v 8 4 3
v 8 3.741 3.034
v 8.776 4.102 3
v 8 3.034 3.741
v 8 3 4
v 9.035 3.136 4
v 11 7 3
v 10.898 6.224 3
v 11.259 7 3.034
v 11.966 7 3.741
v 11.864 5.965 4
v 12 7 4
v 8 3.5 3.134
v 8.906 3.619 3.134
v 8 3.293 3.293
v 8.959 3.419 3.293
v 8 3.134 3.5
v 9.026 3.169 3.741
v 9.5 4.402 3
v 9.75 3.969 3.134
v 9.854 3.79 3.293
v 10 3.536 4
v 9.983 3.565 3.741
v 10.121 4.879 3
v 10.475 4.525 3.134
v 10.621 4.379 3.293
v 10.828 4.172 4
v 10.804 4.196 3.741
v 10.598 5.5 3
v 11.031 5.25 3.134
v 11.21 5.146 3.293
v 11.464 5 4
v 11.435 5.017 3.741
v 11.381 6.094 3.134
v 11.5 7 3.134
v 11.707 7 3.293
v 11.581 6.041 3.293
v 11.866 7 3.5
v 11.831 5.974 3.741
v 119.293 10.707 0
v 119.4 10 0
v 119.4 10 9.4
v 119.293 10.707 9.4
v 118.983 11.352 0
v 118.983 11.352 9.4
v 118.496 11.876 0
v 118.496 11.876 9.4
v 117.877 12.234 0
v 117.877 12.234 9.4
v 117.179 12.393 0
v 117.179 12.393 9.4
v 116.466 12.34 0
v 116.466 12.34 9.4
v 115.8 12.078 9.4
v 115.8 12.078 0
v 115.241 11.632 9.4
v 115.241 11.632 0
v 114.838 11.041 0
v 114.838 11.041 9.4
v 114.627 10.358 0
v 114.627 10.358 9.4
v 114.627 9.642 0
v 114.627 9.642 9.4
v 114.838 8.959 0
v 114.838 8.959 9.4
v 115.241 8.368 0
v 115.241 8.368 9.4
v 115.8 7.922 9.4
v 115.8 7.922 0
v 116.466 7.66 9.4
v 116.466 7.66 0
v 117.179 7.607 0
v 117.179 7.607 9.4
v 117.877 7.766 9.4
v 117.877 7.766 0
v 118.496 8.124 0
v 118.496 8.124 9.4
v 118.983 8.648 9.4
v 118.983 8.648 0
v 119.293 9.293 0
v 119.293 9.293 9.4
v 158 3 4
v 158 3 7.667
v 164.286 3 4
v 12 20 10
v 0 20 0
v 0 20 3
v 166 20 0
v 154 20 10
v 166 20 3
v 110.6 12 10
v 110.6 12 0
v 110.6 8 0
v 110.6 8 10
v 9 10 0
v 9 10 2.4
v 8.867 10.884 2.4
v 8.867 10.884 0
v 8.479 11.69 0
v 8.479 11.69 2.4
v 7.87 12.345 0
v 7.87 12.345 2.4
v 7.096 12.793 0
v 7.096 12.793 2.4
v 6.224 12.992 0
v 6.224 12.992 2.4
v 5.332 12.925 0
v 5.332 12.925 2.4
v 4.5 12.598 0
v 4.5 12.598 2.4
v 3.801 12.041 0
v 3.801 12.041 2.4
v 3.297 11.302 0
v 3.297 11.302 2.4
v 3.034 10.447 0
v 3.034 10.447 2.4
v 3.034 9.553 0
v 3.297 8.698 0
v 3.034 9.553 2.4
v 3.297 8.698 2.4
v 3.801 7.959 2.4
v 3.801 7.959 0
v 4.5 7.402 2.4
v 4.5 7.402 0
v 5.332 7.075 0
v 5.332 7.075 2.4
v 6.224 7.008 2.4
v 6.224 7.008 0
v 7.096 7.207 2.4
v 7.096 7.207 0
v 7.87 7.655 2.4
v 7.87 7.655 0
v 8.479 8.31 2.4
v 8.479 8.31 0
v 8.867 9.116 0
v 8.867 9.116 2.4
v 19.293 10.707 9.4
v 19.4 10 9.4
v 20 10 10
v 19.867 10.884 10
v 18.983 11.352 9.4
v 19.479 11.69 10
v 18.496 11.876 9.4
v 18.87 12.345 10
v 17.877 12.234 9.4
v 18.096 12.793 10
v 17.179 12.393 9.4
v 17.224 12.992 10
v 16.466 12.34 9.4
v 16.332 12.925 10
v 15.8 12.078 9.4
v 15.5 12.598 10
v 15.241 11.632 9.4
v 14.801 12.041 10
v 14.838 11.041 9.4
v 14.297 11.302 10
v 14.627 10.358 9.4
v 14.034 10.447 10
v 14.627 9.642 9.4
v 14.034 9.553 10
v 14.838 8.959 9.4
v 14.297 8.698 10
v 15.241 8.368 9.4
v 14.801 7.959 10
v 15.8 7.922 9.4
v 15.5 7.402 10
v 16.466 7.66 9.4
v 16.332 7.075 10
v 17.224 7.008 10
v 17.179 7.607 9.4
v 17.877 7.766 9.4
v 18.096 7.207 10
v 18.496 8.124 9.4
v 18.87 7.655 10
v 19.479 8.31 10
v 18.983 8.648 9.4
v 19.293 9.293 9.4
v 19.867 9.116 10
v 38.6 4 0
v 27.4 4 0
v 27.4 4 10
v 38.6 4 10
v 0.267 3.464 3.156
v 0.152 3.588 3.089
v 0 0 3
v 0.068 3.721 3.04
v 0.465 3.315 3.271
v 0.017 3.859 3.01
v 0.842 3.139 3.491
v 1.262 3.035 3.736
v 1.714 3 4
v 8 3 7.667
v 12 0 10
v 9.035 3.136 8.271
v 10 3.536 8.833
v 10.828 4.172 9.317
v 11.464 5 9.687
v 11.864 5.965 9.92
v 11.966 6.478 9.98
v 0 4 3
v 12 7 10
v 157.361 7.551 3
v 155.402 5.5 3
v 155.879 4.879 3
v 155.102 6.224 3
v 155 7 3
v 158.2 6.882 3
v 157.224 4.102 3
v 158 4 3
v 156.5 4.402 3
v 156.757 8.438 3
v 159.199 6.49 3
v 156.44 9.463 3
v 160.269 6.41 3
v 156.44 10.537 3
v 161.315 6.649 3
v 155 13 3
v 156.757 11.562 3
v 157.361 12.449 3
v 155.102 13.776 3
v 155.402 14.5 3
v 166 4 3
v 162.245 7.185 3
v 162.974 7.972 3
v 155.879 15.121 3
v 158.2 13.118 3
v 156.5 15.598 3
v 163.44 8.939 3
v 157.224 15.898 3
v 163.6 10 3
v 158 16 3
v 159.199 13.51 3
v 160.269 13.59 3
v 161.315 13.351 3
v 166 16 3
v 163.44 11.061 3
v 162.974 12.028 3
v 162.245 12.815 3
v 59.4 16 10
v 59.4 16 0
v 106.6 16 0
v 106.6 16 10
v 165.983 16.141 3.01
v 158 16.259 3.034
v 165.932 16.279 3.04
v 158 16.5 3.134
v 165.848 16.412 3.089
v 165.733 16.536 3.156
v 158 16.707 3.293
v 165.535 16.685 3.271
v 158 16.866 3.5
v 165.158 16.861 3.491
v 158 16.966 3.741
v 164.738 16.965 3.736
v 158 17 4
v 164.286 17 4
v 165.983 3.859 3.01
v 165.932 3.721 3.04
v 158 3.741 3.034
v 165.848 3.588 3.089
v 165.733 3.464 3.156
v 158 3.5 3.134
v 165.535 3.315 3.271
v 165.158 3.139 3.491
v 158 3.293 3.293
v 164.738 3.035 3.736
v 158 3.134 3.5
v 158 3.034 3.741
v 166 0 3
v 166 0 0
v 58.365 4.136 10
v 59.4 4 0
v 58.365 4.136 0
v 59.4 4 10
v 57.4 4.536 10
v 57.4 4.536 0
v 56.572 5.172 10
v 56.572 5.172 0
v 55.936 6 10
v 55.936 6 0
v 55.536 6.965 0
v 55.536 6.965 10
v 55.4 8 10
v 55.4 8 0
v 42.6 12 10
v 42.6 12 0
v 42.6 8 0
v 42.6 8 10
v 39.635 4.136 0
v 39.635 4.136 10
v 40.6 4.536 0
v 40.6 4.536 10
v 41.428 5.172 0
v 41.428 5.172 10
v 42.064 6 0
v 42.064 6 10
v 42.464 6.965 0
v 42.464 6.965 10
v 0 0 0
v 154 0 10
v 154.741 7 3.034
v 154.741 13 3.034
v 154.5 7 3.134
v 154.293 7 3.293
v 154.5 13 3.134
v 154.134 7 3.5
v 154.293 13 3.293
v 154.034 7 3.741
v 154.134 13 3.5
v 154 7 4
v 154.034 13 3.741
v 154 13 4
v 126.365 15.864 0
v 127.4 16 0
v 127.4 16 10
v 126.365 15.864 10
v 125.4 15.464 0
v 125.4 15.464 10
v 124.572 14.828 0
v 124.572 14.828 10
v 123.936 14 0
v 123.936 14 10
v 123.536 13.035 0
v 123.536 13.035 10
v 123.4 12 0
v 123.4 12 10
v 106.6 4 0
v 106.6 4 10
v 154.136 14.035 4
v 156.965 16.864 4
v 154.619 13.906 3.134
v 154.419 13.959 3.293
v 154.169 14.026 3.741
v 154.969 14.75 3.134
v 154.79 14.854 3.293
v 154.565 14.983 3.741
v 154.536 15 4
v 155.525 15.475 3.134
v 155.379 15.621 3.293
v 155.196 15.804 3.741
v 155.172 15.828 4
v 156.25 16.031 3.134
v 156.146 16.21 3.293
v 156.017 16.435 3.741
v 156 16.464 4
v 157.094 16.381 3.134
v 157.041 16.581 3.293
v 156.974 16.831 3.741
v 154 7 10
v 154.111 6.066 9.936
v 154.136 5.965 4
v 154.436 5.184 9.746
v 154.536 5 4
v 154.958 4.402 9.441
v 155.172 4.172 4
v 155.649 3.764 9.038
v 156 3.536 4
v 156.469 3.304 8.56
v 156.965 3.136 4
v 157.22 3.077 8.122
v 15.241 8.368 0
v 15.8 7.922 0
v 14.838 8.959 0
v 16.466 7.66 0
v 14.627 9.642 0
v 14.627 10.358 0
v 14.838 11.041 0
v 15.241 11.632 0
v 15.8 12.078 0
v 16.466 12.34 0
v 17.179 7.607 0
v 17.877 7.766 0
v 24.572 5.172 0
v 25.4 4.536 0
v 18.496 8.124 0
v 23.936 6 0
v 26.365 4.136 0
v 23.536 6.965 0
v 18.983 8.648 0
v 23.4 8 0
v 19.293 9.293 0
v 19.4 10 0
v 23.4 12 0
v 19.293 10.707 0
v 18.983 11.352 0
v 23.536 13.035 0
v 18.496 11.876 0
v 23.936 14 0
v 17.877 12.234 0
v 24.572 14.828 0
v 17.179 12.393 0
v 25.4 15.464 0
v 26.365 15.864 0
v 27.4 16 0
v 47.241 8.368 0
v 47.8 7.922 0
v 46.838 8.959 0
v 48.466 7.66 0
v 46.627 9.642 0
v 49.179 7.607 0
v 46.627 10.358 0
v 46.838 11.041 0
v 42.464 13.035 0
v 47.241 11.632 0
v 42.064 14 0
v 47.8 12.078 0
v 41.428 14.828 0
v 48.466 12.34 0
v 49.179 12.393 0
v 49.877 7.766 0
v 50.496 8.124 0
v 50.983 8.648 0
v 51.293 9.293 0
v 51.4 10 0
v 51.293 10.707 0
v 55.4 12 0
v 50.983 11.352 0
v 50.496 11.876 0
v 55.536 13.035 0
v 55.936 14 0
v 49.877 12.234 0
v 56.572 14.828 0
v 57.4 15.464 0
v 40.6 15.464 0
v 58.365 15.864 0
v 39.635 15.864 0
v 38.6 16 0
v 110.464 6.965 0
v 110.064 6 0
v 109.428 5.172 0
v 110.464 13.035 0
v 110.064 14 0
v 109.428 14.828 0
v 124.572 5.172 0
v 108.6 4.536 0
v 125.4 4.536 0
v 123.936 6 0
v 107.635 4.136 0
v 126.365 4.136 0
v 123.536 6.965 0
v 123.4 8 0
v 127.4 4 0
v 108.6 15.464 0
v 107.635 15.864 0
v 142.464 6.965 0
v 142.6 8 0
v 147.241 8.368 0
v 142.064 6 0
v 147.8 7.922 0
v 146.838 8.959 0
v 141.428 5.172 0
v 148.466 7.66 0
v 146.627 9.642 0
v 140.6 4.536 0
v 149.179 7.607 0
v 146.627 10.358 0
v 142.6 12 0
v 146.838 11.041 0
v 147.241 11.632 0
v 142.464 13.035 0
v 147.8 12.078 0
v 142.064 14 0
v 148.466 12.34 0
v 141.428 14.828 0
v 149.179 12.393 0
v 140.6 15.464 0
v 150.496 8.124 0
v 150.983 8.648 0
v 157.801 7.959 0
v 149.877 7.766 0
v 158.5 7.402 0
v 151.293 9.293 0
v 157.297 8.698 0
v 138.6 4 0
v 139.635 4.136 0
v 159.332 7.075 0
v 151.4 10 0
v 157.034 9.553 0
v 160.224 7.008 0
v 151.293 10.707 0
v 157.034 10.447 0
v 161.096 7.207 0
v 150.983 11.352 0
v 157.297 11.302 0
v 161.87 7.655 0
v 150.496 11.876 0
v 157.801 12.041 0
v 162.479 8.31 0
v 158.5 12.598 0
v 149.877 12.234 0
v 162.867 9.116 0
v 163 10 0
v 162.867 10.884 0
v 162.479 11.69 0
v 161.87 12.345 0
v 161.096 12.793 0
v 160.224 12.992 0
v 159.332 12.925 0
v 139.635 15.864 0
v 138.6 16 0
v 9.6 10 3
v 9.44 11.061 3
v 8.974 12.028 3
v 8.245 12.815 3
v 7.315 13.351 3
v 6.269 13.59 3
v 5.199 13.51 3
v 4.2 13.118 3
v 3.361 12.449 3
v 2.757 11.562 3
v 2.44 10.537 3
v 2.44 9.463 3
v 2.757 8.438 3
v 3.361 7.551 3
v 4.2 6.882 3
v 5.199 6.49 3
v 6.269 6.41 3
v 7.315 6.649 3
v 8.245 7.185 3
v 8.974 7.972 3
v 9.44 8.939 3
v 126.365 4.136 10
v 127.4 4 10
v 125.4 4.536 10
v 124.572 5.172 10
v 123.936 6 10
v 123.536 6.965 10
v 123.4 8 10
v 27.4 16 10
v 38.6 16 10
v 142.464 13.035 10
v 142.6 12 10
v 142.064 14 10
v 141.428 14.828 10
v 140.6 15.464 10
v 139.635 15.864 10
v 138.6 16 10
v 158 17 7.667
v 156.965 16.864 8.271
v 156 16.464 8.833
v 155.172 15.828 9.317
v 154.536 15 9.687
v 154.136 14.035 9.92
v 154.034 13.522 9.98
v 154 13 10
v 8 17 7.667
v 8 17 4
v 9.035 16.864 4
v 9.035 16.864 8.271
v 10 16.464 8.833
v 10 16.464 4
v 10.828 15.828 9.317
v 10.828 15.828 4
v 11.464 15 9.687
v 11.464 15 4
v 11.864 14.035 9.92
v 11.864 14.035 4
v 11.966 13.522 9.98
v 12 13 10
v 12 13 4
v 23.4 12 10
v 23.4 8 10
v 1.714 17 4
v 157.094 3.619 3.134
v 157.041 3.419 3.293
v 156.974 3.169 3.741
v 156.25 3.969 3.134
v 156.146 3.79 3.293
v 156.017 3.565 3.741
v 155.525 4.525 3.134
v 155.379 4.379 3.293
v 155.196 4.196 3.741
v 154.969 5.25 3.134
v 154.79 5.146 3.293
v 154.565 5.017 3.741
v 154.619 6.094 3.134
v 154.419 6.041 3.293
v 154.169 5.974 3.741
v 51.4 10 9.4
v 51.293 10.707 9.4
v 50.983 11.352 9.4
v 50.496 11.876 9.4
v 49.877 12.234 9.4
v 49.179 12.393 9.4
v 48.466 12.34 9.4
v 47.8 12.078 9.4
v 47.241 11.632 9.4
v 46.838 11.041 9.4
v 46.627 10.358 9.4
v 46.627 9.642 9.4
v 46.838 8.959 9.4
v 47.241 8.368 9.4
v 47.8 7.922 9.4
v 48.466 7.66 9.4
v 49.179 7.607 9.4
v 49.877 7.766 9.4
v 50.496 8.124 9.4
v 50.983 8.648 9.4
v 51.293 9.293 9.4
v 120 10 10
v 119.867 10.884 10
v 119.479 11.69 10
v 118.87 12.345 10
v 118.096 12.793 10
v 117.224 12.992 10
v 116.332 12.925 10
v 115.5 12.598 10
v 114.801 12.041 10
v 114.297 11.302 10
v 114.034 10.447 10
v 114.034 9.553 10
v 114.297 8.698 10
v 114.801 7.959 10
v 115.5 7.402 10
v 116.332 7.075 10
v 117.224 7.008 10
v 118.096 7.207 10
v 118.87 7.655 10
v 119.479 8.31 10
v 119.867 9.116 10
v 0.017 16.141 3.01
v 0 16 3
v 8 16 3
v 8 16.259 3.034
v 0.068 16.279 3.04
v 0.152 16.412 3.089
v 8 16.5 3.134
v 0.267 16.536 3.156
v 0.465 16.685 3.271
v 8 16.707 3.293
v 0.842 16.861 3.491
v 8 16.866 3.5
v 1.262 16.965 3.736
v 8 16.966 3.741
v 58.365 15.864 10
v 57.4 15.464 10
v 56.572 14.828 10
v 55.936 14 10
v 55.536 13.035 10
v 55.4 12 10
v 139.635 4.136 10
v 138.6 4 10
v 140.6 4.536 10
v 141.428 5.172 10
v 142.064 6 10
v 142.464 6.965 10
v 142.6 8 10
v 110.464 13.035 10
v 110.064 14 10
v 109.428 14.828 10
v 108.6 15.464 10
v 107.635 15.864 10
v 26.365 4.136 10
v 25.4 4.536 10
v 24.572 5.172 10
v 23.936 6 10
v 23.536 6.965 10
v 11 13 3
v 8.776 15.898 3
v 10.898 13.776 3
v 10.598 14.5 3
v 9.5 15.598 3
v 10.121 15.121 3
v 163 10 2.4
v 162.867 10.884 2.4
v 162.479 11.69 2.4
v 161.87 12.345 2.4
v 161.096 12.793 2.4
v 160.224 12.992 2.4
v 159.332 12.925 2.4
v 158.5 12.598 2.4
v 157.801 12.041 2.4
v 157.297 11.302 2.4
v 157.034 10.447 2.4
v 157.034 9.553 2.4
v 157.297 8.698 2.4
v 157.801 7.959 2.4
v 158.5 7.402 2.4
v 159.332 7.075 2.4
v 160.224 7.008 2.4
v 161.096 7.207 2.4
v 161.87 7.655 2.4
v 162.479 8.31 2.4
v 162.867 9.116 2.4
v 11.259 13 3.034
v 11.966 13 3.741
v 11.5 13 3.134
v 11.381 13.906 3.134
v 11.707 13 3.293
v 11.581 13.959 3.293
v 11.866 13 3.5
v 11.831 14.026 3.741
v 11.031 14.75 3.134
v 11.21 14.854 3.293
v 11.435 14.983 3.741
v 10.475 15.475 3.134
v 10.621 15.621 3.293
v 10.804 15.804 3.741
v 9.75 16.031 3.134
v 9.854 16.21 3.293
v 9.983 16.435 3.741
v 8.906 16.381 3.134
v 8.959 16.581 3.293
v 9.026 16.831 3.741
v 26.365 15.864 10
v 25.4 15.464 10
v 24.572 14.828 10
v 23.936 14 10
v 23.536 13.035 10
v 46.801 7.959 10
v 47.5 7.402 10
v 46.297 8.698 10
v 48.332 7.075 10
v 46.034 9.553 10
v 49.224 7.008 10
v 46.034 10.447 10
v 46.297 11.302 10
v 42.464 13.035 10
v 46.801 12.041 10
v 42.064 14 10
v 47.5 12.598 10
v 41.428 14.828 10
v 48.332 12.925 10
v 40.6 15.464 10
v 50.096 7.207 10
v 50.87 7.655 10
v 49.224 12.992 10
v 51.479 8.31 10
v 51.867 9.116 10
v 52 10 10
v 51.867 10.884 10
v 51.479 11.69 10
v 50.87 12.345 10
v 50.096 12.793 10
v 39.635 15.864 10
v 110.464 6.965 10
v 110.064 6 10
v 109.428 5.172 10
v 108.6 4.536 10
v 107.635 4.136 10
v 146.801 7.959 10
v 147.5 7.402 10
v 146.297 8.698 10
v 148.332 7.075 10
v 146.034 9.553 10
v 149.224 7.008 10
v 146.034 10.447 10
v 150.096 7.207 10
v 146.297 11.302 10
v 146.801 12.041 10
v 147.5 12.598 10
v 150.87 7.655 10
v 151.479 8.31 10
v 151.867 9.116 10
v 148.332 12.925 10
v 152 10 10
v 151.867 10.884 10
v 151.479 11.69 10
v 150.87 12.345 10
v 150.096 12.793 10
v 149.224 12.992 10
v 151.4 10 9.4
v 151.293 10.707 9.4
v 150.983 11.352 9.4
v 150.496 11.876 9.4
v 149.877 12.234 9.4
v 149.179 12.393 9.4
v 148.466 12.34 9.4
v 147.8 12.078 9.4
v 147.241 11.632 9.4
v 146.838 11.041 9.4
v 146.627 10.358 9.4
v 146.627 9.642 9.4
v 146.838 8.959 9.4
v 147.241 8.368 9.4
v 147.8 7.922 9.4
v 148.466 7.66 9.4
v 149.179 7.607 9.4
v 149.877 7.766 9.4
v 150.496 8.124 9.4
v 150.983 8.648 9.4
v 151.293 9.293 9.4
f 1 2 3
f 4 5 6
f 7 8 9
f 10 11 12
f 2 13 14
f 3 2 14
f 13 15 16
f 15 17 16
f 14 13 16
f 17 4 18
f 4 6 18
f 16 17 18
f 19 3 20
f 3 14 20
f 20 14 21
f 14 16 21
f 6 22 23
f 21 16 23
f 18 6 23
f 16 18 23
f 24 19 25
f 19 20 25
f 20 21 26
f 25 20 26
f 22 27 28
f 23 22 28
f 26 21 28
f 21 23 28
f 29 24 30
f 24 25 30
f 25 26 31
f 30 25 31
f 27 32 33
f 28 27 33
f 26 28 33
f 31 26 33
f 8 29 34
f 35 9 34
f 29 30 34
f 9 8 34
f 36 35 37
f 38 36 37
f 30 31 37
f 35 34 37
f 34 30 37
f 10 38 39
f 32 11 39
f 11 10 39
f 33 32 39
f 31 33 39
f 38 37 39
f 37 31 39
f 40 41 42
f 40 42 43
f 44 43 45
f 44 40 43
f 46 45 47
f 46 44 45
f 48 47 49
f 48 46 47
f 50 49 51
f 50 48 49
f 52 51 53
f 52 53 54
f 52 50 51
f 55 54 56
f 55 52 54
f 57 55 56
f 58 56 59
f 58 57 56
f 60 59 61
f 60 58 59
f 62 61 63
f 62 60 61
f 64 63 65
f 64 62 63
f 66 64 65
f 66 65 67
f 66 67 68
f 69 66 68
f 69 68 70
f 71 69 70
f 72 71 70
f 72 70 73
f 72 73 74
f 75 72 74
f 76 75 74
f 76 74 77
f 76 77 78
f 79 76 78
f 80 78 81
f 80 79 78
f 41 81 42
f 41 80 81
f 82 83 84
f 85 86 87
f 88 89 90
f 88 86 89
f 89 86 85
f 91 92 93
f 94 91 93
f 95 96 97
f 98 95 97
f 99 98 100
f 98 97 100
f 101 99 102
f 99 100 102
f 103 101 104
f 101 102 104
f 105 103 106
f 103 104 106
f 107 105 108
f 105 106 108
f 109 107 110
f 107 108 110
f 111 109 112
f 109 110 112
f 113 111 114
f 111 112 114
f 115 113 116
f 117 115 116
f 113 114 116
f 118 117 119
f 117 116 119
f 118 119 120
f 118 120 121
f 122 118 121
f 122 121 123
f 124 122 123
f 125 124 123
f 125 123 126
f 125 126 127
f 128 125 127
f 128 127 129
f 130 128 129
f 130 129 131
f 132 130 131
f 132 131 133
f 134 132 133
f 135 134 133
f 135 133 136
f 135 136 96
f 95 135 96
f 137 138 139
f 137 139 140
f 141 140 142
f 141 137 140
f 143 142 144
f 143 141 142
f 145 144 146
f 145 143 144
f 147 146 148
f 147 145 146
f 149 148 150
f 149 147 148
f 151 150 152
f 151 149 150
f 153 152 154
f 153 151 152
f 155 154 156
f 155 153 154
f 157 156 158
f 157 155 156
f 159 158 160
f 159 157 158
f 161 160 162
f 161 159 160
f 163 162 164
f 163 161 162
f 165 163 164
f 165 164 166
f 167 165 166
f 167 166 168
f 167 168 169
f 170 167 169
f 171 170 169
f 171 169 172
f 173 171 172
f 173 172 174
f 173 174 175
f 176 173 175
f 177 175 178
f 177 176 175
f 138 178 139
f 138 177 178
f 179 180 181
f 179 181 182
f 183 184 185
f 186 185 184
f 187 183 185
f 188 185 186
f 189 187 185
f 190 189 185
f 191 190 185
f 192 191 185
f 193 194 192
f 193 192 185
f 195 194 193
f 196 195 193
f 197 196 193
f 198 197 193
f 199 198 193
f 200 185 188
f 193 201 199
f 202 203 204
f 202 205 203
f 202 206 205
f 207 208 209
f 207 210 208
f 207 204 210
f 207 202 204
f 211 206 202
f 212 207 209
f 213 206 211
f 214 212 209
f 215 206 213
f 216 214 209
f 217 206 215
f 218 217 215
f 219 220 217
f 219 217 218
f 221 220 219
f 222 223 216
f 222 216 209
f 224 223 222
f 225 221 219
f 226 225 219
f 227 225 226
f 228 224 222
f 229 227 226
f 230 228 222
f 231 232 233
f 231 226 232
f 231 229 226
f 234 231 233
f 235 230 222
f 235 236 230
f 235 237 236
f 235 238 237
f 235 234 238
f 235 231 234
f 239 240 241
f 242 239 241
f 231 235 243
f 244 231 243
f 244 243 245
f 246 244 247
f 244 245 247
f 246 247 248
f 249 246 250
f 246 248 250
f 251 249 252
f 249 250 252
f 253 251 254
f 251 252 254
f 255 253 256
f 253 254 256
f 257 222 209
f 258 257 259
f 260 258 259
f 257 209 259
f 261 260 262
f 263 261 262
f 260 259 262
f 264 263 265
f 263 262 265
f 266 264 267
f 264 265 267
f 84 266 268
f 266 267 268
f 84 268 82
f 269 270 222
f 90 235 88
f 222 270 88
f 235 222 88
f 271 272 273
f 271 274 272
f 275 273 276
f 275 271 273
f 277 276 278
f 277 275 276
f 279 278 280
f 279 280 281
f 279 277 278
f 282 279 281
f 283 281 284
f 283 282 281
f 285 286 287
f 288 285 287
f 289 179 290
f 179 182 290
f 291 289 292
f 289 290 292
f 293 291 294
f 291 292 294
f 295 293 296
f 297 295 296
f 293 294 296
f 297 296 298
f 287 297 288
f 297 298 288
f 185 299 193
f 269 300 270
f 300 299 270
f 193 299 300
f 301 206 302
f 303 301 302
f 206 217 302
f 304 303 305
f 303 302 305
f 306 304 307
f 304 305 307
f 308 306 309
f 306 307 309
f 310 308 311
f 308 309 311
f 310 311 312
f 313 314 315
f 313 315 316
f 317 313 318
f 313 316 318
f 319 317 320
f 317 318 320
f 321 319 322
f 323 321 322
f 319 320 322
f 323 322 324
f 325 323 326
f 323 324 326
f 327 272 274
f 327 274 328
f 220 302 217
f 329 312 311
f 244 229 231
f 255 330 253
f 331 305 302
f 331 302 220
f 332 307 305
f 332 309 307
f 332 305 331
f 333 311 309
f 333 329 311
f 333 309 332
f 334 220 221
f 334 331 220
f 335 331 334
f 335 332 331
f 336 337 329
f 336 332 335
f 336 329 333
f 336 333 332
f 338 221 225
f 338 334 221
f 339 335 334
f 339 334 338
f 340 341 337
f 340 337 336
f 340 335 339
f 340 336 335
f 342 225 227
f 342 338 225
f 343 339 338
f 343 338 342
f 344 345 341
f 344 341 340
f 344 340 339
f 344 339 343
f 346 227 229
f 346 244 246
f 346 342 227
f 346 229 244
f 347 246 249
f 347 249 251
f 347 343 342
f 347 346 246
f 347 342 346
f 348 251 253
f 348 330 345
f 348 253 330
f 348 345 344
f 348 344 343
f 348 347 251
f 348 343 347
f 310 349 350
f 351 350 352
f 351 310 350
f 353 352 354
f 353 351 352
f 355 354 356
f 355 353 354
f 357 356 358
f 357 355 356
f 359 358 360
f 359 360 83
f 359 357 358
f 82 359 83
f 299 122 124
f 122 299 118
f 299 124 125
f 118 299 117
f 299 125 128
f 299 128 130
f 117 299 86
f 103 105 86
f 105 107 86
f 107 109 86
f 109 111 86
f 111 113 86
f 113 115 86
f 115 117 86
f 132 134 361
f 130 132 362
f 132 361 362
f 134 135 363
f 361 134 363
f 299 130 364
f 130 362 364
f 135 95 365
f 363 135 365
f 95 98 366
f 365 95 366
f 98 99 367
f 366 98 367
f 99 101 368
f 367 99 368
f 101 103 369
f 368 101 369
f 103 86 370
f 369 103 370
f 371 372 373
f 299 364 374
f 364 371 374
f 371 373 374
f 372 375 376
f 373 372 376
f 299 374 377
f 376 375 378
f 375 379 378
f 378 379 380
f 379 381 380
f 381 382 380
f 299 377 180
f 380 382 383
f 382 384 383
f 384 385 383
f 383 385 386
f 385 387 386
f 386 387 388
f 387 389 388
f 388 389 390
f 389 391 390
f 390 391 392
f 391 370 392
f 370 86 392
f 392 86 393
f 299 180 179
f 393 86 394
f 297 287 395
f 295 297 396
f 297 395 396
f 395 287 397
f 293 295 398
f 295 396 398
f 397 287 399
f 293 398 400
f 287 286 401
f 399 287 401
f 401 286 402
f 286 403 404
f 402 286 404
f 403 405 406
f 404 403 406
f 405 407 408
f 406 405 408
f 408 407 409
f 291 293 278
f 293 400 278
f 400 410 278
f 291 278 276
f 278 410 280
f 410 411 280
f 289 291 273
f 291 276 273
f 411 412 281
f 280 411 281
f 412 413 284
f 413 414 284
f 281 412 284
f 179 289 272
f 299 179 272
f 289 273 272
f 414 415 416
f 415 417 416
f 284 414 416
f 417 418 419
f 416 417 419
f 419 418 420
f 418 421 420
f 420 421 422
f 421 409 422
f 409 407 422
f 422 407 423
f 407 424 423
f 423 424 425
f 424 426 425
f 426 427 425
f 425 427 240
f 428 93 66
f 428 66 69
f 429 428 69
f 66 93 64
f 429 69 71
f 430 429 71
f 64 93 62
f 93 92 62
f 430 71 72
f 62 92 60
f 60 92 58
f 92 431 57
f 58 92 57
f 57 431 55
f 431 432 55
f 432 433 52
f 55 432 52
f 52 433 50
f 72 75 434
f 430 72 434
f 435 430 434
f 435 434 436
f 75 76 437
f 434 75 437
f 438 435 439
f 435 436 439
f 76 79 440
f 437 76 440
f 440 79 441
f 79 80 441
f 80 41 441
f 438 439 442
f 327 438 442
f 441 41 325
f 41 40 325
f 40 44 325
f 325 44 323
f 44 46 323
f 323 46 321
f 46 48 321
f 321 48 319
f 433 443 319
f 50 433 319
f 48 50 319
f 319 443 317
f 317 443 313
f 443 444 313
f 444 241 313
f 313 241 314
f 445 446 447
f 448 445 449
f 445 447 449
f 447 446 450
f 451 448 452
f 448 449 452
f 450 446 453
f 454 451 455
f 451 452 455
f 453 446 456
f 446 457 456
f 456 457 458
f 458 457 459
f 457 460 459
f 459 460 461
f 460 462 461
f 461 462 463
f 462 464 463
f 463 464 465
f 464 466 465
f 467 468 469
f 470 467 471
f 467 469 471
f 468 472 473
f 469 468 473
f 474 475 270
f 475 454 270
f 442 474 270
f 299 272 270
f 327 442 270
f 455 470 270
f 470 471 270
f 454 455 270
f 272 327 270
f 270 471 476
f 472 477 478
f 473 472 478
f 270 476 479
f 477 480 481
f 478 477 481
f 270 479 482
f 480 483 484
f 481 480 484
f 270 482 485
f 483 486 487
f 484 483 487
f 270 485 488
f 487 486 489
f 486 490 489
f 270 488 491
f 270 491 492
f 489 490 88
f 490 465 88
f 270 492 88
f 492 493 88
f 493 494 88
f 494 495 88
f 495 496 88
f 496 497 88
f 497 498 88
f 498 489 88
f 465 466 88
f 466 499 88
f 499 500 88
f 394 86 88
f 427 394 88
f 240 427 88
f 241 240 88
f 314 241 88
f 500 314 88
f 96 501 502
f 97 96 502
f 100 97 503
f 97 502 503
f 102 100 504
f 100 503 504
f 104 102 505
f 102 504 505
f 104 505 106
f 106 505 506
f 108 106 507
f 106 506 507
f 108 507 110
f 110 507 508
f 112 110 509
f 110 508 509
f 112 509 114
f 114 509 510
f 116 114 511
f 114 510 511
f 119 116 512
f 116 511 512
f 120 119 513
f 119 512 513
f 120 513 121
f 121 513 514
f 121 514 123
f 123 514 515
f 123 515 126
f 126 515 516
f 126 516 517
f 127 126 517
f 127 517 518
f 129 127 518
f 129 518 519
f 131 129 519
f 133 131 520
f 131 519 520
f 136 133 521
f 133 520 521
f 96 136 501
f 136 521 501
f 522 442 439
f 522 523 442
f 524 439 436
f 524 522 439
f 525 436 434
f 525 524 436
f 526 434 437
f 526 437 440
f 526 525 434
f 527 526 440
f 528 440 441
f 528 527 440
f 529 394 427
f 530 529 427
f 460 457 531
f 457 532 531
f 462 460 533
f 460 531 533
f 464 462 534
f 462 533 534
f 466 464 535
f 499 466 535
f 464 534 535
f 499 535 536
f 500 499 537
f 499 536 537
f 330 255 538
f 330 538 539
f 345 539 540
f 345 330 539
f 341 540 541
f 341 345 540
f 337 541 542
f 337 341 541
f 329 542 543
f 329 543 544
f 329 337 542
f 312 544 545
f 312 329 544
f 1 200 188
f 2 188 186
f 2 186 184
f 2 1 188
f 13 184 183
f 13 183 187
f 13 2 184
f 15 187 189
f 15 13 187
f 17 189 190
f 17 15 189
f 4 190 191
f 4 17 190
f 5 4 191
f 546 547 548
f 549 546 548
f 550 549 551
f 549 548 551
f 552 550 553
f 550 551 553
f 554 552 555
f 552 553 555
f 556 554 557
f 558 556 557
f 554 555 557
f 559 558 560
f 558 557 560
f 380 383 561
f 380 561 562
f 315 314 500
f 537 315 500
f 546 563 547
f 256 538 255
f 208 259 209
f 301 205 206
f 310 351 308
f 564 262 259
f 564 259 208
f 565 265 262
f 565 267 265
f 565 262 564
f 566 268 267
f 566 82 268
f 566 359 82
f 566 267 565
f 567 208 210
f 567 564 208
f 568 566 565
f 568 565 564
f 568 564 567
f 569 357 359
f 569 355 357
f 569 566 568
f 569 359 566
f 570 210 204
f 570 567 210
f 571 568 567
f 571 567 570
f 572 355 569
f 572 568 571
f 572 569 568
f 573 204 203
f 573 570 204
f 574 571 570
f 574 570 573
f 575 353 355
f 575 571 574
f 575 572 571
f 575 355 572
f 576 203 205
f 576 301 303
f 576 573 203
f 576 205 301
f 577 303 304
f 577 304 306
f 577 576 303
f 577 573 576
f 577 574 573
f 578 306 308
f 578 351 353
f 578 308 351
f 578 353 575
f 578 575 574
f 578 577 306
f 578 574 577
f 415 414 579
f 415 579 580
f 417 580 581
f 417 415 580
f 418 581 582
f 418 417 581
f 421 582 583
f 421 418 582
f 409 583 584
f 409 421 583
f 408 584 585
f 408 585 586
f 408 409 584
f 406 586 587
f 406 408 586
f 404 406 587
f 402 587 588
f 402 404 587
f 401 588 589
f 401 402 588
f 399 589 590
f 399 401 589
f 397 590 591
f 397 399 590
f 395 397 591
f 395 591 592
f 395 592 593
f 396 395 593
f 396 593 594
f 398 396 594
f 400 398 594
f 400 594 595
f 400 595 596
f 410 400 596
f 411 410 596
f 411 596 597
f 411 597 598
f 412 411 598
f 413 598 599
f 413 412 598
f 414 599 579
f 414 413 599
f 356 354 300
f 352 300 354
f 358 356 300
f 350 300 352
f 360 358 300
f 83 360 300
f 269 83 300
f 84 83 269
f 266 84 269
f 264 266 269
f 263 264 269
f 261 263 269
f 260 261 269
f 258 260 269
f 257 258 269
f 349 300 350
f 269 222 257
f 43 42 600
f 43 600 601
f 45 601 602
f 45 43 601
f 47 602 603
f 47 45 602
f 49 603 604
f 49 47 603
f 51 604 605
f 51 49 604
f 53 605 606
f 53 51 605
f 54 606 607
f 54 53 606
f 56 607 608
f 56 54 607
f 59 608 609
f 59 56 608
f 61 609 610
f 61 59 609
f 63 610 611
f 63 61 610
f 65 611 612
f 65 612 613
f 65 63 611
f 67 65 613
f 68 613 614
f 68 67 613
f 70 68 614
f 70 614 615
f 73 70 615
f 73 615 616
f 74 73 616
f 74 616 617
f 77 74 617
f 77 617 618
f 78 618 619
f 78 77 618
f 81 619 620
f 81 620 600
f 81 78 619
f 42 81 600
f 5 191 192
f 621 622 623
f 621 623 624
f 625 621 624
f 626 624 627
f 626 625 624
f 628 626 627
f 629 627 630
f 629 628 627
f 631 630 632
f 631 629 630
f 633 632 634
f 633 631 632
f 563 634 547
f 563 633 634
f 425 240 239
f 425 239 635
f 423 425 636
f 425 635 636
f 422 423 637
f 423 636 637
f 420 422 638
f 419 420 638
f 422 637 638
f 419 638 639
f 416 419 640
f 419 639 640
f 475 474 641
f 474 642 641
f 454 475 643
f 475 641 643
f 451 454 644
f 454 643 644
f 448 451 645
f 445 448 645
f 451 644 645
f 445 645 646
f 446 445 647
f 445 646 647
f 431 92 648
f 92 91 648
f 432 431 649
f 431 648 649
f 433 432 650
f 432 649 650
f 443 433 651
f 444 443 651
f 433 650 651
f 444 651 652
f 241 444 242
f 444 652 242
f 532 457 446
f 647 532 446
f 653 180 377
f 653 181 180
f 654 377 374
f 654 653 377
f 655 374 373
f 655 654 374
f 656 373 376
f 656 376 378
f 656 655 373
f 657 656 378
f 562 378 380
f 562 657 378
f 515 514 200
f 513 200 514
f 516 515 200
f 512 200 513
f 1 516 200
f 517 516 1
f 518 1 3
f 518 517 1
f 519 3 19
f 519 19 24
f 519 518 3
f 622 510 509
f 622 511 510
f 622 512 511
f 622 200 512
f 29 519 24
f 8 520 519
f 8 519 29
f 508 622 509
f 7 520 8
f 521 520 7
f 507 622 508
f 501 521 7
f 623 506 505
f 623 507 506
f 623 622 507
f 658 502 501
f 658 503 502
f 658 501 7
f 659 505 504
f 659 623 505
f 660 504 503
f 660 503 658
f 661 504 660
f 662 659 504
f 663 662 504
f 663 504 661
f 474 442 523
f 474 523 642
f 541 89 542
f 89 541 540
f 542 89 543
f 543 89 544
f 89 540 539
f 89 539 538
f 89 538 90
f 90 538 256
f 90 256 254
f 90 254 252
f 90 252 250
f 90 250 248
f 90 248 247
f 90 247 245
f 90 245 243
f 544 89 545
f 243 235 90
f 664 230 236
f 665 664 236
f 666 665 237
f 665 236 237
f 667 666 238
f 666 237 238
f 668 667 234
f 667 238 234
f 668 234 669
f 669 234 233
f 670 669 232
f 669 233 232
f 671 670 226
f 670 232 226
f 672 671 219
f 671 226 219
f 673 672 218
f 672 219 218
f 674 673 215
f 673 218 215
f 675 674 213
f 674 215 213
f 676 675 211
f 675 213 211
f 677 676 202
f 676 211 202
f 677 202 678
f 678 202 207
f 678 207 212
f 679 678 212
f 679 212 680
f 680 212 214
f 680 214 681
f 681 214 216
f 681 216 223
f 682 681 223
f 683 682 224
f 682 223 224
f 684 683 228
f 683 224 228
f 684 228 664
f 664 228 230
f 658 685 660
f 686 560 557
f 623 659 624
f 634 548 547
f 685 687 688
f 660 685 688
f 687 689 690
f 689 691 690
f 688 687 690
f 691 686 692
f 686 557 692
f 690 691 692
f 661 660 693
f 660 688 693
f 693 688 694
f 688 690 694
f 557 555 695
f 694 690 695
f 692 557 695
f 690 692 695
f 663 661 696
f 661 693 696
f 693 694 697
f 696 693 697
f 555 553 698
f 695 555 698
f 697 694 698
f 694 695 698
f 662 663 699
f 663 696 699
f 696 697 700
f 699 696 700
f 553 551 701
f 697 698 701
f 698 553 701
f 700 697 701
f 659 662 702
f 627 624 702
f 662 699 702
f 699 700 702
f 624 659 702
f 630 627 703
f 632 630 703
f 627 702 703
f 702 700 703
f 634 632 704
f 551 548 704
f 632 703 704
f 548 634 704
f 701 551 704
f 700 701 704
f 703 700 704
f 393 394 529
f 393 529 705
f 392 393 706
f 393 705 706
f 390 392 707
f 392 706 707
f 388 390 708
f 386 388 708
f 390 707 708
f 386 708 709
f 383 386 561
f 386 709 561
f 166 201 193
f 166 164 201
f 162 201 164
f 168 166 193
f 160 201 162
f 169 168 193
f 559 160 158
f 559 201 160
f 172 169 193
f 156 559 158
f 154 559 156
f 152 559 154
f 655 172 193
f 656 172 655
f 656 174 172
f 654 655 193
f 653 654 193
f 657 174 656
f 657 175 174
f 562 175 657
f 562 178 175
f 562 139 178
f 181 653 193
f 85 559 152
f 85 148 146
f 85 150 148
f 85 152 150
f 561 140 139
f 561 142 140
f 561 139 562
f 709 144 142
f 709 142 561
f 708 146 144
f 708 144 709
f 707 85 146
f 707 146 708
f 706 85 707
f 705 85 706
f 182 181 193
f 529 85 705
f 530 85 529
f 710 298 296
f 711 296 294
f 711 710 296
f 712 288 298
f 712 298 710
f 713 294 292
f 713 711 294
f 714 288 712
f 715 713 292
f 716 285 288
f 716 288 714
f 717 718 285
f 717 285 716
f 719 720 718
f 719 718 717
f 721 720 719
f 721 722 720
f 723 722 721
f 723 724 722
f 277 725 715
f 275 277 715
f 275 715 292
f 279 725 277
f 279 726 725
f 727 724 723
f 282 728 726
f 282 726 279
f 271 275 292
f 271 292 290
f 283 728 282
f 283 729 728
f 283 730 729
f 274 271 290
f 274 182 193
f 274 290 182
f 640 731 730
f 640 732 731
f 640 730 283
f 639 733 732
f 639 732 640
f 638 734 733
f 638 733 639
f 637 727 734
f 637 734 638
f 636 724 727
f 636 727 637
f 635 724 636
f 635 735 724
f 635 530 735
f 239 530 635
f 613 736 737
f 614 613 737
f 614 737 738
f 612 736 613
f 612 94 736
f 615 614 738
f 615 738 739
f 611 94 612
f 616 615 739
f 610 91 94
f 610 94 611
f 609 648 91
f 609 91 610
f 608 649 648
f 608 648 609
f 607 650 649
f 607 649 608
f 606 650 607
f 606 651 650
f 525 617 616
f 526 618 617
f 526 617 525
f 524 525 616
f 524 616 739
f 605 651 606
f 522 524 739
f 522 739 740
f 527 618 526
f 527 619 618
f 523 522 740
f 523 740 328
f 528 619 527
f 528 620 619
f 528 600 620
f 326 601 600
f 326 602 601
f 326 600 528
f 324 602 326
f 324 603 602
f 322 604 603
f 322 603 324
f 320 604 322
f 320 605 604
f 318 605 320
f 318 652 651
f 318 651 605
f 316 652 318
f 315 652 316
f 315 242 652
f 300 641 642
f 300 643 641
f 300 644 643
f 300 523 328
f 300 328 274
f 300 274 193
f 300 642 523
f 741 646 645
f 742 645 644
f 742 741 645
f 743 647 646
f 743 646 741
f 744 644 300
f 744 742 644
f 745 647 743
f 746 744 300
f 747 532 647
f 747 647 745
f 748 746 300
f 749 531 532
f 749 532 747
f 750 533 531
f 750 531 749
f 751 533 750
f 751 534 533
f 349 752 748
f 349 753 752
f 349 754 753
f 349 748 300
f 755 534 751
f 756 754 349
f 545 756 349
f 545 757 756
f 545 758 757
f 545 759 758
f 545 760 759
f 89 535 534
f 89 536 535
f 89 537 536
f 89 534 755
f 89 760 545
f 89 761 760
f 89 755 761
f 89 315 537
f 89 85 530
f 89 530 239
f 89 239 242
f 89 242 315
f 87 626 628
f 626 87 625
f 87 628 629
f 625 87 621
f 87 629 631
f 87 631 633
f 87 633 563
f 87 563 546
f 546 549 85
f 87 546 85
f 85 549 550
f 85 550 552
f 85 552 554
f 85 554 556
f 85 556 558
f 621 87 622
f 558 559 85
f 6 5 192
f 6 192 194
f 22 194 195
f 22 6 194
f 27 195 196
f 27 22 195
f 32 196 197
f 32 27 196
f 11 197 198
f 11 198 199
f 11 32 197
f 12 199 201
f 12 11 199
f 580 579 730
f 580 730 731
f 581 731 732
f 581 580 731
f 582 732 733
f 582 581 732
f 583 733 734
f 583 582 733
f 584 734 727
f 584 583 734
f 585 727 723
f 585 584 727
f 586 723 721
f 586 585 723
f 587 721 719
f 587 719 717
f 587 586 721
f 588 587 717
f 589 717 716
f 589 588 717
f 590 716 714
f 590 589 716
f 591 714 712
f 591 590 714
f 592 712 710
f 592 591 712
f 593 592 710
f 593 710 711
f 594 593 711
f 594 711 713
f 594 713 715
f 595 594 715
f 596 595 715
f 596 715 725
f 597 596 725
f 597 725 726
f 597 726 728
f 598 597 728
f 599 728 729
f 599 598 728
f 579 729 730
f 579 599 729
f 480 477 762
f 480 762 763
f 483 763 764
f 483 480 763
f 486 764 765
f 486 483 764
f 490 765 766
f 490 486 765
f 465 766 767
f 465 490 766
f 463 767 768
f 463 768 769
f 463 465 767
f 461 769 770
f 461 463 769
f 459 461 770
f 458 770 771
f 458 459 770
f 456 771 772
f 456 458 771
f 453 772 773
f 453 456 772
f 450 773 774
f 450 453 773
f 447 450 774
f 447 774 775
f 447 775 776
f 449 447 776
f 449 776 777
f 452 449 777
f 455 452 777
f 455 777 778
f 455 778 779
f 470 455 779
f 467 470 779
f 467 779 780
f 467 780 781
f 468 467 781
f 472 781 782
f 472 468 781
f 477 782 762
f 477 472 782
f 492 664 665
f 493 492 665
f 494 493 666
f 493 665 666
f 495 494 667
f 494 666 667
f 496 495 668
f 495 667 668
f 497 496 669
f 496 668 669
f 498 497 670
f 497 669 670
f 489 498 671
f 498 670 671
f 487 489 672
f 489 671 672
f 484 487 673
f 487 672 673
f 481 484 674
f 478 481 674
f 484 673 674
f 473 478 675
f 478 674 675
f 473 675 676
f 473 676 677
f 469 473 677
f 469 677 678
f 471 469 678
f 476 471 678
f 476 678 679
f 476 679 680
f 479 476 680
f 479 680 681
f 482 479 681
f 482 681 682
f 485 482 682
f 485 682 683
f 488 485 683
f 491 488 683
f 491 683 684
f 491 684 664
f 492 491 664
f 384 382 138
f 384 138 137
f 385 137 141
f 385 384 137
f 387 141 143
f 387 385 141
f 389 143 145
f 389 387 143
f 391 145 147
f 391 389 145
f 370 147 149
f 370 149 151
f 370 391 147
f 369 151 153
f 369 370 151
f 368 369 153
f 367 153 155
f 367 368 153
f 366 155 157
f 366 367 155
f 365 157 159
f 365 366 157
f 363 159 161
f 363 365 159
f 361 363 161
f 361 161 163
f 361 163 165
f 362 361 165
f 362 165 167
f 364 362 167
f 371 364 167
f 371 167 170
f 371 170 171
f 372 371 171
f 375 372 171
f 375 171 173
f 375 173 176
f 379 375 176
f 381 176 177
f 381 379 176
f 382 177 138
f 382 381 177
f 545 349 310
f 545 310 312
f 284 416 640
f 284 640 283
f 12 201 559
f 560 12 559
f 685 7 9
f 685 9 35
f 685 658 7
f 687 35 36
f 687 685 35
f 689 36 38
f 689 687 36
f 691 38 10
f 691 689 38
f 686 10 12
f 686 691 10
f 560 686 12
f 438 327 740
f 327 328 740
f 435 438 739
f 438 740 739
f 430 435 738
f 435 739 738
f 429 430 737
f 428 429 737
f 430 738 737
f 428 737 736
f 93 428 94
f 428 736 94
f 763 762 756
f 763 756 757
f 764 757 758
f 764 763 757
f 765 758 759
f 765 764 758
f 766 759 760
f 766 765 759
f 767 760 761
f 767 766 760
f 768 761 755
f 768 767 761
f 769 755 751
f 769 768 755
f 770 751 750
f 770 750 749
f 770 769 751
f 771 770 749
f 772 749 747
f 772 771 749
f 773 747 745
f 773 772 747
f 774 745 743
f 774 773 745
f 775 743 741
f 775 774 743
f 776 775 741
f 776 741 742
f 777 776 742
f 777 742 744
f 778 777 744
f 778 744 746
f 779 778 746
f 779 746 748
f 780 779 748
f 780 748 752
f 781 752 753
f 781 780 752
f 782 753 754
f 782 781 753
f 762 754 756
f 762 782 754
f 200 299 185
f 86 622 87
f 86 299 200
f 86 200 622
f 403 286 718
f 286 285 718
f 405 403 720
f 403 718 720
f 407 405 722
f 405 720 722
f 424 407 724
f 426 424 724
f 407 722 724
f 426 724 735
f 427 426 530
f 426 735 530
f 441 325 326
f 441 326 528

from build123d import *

# Parameters (mm, degrees)
F0_W          = 166
F0_H          = 20
F0_R          = 2.4
F1_DEPTH      = 10
F2_W          = 12
F2_H          = 14
F3_DEPTH      = 7
F5_DEPTH      = 3.001
F5_DEPTH_BACK = 17.001
F6_R          = 4
F7_R          = 1
F8_R          = 3
F9_DEPTH      = 3.001
F10_W         = 55.2
F10_H         = 12
F10_W_2       = 19.2
F11_DEPTH     = 10.001
F12_R         = 4
F13_SIZE      = 0.6


with BuildPart() as f1:
    # F0 (on Top) → F1 (new body)
    with BuildSketch(Plane.XY):
        with Locations((83, 10)):
            Rectangle(F0_W, F0_H)
        with Locations((17, 10)):
            Circle(F0_R, mode=Mode.SUBTRACT)
        with Locations((49, 10)):
            Circle(F0_R, mode=Mode.SUBTRACT)
        with Locations((117, 10)):
            Circle(F0_R, mode=Mode.SUBTRACT)
        with Locations((149, 10)):
            Circle(F0_R, mode=Mode.SUBTRACT)
    extrude(amount=F1_DEPTH)

    # F2 (on face) → F3 (cut)
    with BuildSketch(Plane.XY.offset(10)):
        with Locations((6, 10)):
            Rectangle(F2_W, F2_H)
        with Locations((160, 10)):
            Rectangle(F2_W, F2_H)
    extrude(amount=-F3_DEPTH, mode=Mode.SUBTRACT)

    # F4 (on face) → F5 (cut, two sides)
    with BuildSketch(Plane.XZ.offset(-17)) as f5_sk:
        Polygon((0, 10), (0, 3), (12, 10), align=None)
        Polygon((166, 3), (166, 10), (154, 10), align=None)
    extrude(amount=-F5_DEPTH, mode=Mode.SUBTRACT)
    extrude(f5_sk.sketch, amount=F5_DEPTH_BACK, mode=Mode.SUBTRACT)

    # F6
    f6_edges = [f1.edges().sort_by_distance(p)[0] for p in [
        (12, 17, 6.5),
        (12, 3, 6.5),
        (154, 3, 6.5),
        (154, 17, 6.5),
    ]]
    fillet(f6_edges, radius=F6_R)

    # F7
    f7_edges = [f1.edges().sort_by_distance(p)[0] for p in [
        (162, 17, 3),
        (4, 3, 3),
    ]]
    fillet(f7_edges, radius=F7_R)

    # F8 (on face) → F9 (cut, through all)
    with BuildSketch(Plane.XY.offset(3)):
        with Locations((160, 10)):
            Circle(F8_R)
        with Locations((6, 10)):
            Circle(F8_R)
    extrude(amount=-F9_DEPTH, mode=Mode.SUBTRACT)

    # F10 (on face) → F11 (cut, through all)
    with BuildSketch(Plane(origin=(0, 0, 0), x_dir=(1, 0, 0), z_dir=(0, 0, -1))):
        with Locations((83, -10)):
            Rectangle(F10_W, F10_H)
        with Locations((133, -10)):
            Rectangle(F10_W_2, F10_H)
        with Locations((33, -10)):
            Rectangle(F10_W_2, F10_H)
    extrude(amount=-F11_DEPTH, mode=Mode.SUBTRACT)

    # F12
    f12_edges = [f1.edges().sort_by_distance(p)[0] for p in [
        (123.4, 16, 5),
        (123.4, 4, 5),
        (142.6, 16, 5),
        (142.6, 4, 5),
        (110.6, 16, 5),
        (110.6, 4, 5),
        (55.4, 16, 5),
        (55.4, 4, 5),
        (42.6, 4, 5),
        (42.6, 16, 5),
        (23.4, 16, 5),
        (23.4, 4, 5),
    ]]
    fillet(f12_edges, radius=F12_R)

    # F13
    f13_edges = [f1.edges().sort_by_distance(p)[0] for p in [
        (3, 10, 3),
        (14.6, 10, 10),
        (46.6, 10, 10),
        (114.6, 10, 10),
        (146.6, 10, 10),
        (157, 10, 3),
    ]]
    chamfer(f13_edges, length=F13_SIZE)


solid = f1.part
